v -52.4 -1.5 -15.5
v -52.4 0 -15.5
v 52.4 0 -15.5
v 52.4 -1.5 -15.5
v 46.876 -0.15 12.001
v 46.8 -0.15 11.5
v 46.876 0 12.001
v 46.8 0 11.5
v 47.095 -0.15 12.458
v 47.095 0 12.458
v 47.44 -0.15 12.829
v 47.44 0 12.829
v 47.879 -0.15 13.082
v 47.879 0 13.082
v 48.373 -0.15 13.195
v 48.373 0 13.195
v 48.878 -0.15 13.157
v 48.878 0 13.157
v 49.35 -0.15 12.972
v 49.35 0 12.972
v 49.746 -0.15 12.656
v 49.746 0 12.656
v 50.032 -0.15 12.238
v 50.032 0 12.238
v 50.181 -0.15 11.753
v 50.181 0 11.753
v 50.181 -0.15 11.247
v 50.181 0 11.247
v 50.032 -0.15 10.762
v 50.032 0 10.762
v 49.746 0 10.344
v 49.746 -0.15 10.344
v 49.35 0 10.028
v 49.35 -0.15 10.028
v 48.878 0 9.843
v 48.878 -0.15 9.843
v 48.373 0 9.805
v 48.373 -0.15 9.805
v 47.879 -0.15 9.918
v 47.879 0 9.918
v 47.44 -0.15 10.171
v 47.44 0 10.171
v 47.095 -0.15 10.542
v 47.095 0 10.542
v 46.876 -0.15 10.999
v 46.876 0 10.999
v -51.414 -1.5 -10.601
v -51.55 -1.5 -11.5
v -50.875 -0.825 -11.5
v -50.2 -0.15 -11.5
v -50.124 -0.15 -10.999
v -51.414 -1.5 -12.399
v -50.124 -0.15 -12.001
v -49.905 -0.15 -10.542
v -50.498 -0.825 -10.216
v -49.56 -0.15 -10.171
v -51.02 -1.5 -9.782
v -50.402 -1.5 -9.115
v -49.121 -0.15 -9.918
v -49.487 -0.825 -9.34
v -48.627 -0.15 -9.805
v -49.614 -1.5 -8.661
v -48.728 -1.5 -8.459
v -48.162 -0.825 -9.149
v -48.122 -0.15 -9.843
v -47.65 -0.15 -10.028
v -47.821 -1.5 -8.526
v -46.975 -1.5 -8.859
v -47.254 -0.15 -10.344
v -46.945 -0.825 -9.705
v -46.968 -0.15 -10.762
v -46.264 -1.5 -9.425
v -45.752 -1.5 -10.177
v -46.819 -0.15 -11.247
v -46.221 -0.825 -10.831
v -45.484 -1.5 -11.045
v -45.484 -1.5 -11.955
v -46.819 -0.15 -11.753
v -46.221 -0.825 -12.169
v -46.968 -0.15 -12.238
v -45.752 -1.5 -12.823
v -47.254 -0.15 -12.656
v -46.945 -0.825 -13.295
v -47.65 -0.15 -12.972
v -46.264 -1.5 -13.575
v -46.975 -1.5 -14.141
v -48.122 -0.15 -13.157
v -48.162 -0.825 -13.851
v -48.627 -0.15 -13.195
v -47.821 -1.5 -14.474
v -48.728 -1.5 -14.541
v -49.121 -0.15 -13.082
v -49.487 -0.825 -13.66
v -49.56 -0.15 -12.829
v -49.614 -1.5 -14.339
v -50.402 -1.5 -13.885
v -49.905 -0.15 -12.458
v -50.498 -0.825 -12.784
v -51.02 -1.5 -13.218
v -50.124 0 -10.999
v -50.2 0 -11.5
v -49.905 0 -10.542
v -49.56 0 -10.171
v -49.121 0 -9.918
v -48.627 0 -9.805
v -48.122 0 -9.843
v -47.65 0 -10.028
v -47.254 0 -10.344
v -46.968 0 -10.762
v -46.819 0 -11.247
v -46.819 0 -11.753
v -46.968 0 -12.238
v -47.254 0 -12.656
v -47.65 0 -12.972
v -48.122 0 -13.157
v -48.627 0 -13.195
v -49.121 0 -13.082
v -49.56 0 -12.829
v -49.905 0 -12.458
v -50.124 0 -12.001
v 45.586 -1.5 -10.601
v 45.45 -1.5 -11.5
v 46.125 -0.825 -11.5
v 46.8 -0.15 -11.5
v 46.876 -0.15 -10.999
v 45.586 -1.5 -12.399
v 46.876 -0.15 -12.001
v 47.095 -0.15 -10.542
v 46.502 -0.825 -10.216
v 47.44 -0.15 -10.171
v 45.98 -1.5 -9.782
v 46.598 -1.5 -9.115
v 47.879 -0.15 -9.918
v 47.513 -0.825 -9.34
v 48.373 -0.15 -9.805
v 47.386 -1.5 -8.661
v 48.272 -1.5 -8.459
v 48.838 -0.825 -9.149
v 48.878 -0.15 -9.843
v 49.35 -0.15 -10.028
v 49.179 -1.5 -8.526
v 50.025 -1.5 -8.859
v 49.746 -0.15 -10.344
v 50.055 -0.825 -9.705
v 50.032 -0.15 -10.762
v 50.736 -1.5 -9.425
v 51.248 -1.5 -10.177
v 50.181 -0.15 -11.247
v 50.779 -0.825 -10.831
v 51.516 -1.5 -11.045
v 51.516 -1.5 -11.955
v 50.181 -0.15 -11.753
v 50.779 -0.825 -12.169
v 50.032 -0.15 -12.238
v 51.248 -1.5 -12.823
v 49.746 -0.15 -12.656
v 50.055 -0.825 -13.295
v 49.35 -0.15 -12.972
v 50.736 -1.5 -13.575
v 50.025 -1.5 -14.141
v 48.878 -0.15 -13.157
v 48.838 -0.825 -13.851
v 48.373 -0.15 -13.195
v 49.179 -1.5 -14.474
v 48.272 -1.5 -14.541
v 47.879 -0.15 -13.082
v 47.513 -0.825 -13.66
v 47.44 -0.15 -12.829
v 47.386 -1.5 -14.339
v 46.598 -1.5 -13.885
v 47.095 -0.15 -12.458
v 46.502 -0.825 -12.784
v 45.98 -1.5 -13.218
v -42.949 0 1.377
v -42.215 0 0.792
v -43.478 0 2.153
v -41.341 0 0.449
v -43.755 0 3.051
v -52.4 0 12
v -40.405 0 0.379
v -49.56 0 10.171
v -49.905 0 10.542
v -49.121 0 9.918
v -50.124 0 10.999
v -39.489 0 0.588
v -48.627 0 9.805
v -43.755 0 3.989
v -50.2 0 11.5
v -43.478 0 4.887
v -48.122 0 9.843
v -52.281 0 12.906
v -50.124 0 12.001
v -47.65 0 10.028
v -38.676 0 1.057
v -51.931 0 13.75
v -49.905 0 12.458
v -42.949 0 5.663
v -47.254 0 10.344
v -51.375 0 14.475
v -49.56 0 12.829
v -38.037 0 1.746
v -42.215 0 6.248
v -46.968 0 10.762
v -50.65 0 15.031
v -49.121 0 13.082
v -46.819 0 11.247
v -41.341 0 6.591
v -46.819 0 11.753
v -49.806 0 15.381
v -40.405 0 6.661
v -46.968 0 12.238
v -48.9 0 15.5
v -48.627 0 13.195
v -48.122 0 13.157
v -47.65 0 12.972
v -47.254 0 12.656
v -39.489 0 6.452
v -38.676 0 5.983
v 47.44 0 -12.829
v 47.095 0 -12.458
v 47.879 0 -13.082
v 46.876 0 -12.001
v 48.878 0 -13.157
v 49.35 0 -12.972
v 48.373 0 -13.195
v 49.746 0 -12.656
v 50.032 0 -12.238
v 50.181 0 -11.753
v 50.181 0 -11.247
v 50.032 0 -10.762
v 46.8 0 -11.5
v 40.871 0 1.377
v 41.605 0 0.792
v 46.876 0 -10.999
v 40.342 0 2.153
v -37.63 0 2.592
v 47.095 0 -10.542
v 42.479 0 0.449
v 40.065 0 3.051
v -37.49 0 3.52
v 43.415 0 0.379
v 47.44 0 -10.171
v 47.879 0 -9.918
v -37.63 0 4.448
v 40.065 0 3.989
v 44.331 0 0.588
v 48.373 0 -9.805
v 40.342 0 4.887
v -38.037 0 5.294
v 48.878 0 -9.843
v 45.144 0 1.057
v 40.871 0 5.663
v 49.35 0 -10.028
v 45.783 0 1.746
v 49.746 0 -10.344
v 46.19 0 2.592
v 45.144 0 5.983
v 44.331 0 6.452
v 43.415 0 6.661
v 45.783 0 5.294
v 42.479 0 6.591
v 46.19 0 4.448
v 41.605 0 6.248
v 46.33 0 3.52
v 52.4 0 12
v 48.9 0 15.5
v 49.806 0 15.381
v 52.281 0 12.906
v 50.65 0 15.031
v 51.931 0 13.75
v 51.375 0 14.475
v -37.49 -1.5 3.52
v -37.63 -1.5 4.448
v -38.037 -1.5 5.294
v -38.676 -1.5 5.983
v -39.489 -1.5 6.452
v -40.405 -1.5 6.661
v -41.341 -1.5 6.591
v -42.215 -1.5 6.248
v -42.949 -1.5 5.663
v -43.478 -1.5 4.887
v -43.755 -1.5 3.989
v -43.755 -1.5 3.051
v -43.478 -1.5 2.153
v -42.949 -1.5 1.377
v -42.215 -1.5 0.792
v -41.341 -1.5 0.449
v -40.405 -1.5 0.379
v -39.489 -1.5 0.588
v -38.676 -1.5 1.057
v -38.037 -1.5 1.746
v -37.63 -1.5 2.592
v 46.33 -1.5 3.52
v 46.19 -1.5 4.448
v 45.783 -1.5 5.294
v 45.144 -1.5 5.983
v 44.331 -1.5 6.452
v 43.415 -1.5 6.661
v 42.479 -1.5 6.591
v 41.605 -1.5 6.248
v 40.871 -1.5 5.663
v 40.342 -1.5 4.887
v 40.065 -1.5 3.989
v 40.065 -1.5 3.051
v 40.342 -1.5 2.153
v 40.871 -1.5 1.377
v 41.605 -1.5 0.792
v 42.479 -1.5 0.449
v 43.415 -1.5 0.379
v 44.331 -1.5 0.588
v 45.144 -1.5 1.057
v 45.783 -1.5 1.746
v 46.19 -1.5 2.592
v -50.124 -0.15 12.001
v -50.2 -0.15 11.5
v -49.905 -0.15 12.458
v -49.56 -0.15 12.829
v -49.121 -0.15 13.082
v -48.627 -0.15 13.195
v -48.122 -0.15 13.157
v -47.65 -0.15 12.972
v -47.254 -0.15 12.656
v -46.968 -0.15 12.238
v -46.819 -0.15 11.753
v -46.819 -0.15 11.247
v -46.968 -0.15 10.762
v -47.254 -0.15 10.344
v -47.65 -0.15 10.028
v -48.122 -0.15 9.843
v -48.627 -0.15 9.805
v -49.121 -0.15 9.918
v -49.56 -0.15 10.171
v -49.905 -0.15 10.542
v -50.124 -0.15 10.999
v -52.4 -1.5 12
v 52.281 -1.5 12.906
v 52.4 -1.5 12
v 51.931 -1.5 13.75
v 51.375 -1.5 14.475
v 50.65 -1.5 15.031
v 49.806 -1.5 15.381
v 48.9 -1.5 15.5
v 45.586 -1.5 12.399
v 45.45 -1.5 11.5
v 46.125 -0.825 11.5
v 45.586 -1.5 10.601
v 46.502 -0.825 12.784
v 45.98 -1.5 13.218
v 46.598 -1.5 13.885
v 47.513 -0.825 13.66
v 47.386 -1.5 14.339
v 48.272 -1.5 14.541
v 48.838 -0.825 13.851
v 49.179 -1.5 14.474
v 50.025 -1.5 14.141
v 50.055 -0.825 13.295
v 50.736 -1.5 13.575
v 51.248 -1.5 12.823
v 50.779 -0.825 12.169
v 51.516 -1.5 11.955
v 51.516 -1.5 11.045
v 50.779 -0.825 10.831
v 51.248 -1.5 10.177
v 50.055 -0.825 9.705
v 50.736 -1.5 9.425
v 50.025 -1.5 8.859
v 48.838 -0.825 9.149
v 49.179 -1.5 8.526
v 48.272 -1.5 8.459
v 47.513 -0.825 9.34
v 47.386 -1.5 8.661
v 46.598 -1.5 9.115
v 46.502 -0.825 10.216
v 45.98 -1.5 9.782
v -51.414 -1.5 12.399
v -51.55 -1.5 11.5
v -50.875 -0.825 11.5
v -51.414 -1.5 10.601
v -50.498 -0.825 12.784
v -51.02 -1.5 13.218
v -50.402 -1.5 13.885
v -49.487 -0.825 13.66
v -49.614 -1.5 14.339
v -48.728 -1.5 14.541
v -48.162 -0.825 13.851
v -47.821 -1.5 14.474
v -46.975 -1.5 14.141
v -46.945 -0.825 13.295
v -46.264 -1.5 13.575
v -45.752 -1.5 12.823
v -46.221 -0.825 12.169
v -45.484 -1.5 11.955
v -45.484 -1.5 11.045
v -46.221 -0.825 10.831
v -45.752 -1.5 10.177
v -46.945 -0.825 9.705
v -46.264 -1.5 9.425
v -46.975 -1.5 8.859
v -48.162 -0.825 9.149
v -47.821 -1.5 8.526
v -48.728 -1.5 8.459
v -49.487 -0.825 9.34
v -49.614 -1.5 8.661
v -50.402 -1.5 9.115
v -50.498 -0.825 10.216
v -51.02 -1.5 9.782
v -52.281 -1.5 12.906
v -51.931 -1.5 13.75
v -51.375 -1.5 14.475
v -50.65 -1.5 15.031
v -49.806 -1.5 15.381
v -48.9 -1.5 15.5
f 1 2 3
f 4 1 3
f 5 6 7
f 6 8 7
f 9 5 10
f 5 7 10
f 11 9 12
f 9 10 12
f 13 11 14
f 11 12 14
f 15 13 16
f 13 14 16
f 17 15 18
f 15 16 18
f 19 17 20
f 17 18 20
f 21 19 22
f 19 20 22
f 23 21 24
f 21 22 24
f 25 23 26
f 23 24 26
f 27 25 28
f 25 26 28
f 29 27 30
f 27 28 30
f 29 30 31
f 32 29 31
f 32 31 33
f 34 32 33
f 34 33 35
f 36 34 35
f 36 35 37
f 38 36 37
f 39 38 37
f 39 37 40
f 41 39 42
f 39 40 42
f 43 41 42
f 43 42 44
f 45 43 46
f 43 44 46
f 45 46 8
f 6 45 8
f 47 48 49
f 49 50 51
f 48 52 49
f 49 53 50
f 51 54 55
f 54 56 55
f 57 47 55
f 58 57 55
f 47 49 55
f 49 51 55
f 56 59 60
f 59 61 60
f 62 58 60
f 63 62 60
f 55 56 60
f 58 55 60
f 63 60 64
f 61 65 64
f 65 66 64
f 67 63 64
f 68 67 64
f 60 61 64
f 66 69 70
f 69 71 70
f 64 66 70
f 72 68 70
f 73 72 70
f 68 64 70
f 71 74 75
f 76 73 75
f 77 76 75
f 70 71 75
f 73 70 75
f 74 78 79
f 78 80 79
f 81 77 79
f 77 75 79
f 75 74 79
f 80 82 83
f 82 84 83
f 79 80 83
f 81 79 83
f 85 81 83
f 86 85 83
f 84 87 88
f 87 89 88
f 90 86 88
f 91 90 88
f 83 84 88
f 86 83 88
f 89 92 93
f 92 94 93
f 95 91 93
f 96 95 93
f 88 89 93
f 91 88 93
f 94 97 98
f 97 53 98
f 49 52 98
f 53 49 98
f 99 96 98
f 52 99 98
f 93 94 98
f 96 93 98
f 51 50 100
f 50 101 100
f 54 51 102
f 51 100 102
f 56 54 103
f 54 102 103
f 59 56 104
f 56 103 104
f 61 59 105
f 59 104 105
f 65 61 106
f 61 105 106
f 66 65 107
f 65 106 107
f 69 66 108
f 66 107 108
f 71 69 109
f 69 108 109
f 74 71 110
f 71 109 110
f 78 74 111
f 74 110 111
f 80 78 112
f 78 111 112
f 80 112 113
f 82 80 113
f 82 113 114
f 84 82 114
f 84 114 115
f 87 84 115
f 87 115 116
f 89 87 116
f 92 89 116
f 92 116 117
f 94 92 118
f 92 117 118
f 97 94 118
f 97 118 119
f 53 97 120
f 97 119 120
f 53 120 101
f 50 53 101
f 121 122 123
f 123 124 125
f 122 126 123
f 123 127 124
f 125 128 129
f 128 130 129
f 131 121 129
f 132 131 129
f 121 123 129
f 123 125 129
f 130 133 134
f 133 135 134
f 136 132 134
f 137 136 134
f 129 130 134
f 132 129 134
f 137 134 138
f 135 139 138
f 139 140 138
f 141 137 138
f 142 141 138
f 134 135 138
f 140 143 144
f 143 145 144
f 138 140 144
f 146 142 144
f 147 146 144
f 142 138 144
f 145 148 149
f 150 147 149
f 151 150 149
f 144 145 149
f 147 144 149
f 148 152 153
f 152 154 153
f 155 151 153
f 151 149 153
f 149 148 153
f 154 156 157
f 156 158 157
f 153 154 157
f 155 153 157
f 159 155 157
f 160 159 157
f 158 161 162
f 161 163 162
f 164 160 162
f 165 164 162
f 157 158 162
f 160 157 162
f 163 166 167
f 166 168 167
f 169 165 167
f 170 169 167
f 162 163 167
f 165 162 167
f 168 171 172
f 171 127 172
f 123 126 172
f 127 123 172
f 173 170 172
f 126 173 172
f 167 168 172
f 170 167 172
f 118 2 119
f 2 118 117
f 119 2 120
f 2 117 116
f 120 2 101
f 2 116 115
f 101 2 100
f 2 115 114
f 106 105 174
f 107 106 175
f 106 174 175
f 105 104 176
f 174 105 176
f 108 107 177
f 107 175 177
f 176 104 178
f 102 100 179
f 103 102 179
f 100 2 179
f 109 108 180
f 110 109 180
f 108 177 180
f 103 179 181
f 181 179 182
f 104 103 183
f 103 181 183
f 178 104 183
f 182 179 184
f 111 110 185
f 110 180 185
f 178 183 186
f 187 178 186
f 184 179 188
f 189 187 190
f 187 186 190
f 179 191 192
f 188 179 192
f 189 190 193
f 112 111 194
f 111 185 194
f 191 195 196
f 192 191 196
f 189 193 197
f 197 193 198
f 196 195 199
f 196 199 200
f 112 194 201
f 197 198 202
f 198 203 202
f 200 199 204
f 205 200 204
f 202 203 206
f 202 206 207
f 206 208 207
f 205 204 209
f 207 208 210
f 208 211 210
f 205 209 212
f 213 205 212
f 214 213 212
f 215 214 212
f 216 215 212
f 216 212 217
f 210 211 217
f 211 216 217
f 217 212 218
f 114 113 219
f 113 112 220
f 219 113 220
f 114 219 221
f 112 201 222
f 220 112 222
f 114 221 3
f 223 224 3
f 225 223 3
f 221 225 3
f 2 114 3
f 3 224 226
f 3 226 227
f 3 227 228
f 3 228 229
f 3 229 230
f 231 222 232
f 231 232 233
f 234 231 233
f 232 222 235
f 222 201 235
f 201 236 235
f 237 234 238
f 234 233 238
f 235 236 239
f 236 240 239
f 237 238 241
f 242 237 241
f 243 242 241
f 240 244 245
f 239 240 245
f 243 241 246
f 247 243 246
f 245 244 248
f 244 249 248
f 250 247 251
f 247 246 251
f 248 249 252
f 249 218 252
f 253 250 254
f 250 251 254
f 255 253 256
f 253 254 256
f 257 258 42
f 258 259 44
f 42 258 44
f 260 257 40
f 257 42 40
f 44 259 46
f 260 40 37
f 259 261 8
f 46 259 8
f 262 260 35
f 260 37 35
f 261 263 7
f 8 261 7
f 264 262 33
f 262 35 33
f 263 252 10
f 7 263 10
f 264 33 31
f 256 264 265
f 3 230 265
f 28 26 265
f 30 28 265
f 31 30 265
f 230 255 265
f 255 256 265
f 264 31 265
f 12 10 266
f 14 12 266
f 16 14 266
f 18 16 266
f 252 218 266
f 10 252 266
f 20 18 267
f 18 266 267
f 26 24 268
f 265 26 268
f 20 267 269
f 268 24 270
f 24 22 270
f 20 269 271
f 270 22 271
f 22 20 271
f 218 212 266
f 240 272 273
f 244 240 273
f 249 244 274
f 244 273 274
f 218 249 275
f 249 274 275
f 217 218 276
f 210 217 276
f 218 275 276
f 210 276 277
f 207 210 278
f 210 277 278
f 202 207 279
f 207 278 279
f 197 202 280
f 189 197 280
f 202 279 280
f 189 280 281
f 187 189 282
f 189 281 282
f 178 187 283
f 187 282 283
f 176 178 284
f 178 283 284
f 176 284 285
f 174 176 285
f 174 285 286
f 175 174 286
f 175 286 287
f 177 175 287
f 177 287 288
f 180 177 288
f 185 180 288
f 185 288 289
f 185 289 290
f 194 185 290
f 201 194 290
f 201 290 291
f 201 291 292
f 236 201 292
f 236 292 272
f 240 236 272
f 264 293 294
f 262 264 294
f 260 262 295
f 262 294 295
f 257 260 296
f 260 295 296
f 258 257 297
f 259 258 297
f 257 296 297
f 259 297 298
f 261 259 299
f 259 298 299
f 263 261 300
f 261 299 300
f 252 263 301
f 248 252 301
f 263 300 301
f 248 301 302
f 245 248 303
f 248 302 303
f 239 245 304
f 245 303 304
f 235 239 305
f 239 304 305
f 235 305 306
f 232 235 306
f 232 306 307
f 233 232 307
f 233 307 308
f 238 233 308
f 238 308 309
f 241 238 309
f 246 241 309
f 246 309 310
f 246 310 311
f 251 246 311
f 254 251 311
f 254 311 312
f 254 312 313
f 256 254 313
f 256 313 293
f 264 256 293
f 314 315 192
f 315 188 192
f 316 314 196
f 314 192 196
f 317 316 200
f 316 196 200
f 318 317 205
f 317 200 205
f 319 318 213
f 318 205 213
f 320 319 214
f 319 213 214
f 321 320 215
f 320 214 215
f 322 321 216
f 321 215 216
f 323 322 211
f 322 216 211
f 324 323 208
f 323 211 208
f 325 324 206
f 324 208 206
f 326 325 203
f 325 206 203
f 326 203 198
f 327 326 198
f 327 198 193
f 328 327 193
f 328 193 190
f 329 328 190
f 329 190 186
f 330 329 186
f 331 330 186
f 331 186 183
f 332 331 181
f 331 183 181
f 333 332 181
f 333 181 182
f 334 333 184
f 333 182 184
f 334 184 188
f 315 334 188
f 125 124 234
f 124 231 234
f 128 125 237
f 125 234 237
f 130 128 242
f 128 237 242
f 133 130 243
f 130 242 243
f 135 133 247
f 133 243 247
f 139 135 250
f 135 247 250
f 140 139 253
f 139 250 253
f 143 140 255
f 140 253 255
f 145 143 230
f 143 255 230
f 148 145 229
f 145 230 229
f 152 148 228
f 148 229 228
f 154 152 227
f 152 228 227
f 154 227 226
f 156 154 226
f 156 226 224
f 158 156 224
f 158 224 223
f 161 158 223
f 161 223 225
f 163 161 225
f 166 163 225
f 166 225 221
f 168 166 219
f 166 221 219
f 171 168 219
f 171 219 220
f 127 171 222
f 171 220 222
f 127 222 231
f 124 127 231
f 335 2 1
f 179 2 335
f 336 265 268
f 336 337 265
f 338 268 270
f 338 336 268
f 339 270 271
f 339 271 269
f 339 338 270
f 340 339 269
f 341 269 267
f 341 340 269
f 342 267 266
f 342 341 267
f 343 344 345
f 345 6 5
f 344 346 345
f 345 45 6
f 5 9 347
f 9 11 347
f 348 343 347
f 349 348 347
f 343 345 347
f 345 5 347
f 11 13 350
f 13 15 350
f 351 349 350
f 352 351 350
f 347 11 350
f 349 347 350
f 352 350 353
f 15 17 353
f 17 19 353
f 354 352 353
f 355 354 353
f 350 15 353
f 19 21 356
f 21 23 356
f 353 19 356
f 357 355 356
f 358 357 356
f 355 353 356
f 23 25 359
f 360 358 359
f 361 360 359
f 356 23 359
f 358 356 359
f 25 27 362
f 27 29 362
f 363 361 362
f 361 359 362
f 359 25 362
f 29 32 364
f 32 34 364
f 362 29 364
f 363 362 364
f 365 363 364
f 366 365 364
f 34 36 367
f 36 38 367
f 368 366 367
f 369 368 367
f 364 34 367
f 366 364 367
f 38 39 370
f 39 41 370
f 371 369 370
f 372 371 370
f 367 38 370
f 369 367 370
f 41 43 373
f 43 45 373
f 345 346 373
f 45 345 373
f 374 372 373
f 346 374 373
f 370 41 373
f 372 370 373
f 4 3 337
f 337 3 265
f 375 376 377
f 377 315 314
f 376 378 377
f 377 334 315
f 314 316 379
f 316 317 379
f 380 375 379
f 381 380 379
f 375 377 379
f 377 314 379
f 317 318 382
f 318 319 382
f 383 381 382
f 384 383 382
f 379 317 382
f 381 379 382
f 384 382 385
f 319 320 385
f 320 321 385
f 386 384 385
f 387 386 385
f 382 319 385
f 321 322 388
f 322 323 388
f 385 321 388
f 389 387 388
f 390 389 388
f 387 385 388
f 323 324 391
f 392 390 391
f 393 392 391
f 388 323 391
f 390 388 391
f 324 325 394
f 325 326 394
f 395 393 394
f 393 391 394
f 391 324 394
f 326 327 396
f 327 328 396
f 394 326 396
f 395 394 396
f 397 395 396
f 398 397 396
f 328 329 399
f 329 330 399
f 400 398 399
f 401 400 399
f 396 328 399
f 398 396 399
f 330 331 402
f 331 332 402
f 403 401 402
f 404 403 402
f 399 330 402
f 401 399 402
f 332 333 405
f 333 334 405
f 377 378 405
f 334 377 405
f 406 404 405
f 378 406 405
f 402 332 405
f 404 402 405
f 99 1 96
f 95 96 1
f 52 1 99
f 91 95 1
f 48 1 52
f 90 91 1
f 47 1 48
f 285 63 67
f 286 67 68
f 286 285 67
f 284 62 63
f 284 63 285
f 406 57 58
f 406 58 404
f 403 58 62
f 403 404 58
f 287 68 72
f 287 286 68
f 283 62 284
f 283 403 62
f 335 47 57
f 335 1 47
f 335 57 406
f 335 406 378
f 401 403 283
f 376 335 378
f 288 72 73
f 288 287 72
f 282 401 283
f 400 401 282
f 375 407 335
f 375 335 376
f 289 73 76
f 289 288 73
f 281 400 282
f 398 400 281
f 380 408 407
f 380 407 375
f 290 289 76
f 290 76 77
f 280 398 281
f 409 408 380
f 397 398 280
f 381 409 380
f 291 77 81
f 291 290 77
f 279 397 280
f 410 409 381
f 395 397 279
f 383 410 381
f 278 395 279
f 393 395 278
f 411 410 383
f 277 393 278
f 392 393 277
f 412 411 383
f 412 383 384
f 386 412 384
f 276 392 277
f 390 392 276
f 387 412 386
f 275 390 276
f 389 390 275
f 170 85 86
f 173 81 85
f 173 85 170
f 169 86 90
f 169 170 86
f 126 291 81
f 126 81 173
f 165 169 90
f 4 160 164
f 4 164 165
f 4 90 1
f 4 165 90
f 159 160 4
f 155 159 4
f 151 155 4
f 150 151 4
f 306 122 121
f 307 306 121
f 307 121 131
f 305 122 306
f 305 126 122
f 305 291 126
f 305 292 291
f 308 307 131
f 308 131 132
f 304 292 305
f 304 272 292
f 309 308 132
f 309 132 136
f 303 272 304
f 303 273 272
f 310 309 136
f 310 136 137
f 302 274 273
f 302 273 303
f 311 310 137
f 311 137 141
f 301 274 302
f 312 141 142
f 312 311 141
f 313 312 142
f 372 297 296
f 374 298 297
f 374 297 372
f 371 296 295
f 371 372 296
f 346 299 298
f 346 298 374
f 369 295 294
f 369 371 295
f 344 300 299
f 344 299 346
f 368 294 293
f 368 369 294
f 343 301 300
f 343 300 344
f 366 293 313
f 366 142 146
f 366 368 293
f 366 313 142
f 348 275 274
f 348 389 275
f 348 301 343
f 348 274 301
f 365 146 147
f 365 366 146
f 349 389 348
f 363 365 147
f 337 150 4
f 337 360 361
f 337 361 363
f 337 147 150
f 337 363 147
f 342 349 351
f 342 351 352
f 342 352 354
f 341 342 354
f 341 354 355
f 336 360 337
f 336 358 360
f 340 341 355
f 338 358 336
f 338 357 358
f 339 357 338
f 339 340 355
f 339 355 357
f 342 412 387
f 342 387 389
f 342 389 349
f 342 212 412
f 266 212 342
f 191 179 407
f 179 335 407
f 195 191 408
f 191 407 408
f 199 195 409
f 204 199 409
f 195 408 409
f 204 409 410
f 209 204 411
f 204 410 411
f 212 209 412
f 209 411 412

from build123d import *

# Parameters (mm, degrees)
SKETCH_W            = 104.8
SKETCH_H            = 31
PAD_DEPTH           = 1.5
HOLE_D              = 3.4
HOLE_DEPTH          = 25
HOLE_CSINK_D        = 6.1
HOLE_CSINK_ANGLE    = 90
FILLET_R            = 3.5
SKETCH002_R         = 3.15
POCKET_DEPTH        = 1.501
LINEARPATTERN_COUNT = 2
LINEARPATTERN_PITCH = 83.82


with BuildPart() as part:
    # Sketch → Pad (new body)
    with BuildSketch(Plane.XZ):
        Rectangle(SKETCH_W, SKETCH_H)
    extrude(amount=PAD_DEPTH)

    # Hole
    with Locations(Plane.XZ.offset(1.5)):
        with Locations((-48.5, 11.5), (-48.5, -11.5), (48.5, -11.5), (48.5, 11.5)):
            CounterSinkHole(HOLE_D / 2, HOLE_CSINK_D / 2, depth=HOLE_DEPTH, counter_sink_angle=HOLE_CSINK_ANGLE)

    # Fillet
    fillet_edges = [part.edges().sort_by_distance(p)[0] for p in [
        (-52.4, -0.75, 15.5),
        (52.4, -0.75, 15.5),
    ]]
    fillet(fillet_edges, radius=FILLET_R)

    # Sketch002 (on Face5 of Fillet) → Pocket (cut, through all)
    with BuildSketch(Plane.XZ.offset(1.5)):
        with Locations((-40.64, 3.52)):
            Circle(SKETCH002_R)
    pocket = extrude(amount=-POCKET_DEPTH, mode=Mode.SUBTRACT)

    # LinearPattern: Pocket ×2
    with Locations(*[(i * LINEARPATTERN_PITCH, 0, 0) for i in range(1, LINEARPATTERN_COUNT)]):
        add(pocket, mode=Mode.SUBTRACT)


solid = part.part
